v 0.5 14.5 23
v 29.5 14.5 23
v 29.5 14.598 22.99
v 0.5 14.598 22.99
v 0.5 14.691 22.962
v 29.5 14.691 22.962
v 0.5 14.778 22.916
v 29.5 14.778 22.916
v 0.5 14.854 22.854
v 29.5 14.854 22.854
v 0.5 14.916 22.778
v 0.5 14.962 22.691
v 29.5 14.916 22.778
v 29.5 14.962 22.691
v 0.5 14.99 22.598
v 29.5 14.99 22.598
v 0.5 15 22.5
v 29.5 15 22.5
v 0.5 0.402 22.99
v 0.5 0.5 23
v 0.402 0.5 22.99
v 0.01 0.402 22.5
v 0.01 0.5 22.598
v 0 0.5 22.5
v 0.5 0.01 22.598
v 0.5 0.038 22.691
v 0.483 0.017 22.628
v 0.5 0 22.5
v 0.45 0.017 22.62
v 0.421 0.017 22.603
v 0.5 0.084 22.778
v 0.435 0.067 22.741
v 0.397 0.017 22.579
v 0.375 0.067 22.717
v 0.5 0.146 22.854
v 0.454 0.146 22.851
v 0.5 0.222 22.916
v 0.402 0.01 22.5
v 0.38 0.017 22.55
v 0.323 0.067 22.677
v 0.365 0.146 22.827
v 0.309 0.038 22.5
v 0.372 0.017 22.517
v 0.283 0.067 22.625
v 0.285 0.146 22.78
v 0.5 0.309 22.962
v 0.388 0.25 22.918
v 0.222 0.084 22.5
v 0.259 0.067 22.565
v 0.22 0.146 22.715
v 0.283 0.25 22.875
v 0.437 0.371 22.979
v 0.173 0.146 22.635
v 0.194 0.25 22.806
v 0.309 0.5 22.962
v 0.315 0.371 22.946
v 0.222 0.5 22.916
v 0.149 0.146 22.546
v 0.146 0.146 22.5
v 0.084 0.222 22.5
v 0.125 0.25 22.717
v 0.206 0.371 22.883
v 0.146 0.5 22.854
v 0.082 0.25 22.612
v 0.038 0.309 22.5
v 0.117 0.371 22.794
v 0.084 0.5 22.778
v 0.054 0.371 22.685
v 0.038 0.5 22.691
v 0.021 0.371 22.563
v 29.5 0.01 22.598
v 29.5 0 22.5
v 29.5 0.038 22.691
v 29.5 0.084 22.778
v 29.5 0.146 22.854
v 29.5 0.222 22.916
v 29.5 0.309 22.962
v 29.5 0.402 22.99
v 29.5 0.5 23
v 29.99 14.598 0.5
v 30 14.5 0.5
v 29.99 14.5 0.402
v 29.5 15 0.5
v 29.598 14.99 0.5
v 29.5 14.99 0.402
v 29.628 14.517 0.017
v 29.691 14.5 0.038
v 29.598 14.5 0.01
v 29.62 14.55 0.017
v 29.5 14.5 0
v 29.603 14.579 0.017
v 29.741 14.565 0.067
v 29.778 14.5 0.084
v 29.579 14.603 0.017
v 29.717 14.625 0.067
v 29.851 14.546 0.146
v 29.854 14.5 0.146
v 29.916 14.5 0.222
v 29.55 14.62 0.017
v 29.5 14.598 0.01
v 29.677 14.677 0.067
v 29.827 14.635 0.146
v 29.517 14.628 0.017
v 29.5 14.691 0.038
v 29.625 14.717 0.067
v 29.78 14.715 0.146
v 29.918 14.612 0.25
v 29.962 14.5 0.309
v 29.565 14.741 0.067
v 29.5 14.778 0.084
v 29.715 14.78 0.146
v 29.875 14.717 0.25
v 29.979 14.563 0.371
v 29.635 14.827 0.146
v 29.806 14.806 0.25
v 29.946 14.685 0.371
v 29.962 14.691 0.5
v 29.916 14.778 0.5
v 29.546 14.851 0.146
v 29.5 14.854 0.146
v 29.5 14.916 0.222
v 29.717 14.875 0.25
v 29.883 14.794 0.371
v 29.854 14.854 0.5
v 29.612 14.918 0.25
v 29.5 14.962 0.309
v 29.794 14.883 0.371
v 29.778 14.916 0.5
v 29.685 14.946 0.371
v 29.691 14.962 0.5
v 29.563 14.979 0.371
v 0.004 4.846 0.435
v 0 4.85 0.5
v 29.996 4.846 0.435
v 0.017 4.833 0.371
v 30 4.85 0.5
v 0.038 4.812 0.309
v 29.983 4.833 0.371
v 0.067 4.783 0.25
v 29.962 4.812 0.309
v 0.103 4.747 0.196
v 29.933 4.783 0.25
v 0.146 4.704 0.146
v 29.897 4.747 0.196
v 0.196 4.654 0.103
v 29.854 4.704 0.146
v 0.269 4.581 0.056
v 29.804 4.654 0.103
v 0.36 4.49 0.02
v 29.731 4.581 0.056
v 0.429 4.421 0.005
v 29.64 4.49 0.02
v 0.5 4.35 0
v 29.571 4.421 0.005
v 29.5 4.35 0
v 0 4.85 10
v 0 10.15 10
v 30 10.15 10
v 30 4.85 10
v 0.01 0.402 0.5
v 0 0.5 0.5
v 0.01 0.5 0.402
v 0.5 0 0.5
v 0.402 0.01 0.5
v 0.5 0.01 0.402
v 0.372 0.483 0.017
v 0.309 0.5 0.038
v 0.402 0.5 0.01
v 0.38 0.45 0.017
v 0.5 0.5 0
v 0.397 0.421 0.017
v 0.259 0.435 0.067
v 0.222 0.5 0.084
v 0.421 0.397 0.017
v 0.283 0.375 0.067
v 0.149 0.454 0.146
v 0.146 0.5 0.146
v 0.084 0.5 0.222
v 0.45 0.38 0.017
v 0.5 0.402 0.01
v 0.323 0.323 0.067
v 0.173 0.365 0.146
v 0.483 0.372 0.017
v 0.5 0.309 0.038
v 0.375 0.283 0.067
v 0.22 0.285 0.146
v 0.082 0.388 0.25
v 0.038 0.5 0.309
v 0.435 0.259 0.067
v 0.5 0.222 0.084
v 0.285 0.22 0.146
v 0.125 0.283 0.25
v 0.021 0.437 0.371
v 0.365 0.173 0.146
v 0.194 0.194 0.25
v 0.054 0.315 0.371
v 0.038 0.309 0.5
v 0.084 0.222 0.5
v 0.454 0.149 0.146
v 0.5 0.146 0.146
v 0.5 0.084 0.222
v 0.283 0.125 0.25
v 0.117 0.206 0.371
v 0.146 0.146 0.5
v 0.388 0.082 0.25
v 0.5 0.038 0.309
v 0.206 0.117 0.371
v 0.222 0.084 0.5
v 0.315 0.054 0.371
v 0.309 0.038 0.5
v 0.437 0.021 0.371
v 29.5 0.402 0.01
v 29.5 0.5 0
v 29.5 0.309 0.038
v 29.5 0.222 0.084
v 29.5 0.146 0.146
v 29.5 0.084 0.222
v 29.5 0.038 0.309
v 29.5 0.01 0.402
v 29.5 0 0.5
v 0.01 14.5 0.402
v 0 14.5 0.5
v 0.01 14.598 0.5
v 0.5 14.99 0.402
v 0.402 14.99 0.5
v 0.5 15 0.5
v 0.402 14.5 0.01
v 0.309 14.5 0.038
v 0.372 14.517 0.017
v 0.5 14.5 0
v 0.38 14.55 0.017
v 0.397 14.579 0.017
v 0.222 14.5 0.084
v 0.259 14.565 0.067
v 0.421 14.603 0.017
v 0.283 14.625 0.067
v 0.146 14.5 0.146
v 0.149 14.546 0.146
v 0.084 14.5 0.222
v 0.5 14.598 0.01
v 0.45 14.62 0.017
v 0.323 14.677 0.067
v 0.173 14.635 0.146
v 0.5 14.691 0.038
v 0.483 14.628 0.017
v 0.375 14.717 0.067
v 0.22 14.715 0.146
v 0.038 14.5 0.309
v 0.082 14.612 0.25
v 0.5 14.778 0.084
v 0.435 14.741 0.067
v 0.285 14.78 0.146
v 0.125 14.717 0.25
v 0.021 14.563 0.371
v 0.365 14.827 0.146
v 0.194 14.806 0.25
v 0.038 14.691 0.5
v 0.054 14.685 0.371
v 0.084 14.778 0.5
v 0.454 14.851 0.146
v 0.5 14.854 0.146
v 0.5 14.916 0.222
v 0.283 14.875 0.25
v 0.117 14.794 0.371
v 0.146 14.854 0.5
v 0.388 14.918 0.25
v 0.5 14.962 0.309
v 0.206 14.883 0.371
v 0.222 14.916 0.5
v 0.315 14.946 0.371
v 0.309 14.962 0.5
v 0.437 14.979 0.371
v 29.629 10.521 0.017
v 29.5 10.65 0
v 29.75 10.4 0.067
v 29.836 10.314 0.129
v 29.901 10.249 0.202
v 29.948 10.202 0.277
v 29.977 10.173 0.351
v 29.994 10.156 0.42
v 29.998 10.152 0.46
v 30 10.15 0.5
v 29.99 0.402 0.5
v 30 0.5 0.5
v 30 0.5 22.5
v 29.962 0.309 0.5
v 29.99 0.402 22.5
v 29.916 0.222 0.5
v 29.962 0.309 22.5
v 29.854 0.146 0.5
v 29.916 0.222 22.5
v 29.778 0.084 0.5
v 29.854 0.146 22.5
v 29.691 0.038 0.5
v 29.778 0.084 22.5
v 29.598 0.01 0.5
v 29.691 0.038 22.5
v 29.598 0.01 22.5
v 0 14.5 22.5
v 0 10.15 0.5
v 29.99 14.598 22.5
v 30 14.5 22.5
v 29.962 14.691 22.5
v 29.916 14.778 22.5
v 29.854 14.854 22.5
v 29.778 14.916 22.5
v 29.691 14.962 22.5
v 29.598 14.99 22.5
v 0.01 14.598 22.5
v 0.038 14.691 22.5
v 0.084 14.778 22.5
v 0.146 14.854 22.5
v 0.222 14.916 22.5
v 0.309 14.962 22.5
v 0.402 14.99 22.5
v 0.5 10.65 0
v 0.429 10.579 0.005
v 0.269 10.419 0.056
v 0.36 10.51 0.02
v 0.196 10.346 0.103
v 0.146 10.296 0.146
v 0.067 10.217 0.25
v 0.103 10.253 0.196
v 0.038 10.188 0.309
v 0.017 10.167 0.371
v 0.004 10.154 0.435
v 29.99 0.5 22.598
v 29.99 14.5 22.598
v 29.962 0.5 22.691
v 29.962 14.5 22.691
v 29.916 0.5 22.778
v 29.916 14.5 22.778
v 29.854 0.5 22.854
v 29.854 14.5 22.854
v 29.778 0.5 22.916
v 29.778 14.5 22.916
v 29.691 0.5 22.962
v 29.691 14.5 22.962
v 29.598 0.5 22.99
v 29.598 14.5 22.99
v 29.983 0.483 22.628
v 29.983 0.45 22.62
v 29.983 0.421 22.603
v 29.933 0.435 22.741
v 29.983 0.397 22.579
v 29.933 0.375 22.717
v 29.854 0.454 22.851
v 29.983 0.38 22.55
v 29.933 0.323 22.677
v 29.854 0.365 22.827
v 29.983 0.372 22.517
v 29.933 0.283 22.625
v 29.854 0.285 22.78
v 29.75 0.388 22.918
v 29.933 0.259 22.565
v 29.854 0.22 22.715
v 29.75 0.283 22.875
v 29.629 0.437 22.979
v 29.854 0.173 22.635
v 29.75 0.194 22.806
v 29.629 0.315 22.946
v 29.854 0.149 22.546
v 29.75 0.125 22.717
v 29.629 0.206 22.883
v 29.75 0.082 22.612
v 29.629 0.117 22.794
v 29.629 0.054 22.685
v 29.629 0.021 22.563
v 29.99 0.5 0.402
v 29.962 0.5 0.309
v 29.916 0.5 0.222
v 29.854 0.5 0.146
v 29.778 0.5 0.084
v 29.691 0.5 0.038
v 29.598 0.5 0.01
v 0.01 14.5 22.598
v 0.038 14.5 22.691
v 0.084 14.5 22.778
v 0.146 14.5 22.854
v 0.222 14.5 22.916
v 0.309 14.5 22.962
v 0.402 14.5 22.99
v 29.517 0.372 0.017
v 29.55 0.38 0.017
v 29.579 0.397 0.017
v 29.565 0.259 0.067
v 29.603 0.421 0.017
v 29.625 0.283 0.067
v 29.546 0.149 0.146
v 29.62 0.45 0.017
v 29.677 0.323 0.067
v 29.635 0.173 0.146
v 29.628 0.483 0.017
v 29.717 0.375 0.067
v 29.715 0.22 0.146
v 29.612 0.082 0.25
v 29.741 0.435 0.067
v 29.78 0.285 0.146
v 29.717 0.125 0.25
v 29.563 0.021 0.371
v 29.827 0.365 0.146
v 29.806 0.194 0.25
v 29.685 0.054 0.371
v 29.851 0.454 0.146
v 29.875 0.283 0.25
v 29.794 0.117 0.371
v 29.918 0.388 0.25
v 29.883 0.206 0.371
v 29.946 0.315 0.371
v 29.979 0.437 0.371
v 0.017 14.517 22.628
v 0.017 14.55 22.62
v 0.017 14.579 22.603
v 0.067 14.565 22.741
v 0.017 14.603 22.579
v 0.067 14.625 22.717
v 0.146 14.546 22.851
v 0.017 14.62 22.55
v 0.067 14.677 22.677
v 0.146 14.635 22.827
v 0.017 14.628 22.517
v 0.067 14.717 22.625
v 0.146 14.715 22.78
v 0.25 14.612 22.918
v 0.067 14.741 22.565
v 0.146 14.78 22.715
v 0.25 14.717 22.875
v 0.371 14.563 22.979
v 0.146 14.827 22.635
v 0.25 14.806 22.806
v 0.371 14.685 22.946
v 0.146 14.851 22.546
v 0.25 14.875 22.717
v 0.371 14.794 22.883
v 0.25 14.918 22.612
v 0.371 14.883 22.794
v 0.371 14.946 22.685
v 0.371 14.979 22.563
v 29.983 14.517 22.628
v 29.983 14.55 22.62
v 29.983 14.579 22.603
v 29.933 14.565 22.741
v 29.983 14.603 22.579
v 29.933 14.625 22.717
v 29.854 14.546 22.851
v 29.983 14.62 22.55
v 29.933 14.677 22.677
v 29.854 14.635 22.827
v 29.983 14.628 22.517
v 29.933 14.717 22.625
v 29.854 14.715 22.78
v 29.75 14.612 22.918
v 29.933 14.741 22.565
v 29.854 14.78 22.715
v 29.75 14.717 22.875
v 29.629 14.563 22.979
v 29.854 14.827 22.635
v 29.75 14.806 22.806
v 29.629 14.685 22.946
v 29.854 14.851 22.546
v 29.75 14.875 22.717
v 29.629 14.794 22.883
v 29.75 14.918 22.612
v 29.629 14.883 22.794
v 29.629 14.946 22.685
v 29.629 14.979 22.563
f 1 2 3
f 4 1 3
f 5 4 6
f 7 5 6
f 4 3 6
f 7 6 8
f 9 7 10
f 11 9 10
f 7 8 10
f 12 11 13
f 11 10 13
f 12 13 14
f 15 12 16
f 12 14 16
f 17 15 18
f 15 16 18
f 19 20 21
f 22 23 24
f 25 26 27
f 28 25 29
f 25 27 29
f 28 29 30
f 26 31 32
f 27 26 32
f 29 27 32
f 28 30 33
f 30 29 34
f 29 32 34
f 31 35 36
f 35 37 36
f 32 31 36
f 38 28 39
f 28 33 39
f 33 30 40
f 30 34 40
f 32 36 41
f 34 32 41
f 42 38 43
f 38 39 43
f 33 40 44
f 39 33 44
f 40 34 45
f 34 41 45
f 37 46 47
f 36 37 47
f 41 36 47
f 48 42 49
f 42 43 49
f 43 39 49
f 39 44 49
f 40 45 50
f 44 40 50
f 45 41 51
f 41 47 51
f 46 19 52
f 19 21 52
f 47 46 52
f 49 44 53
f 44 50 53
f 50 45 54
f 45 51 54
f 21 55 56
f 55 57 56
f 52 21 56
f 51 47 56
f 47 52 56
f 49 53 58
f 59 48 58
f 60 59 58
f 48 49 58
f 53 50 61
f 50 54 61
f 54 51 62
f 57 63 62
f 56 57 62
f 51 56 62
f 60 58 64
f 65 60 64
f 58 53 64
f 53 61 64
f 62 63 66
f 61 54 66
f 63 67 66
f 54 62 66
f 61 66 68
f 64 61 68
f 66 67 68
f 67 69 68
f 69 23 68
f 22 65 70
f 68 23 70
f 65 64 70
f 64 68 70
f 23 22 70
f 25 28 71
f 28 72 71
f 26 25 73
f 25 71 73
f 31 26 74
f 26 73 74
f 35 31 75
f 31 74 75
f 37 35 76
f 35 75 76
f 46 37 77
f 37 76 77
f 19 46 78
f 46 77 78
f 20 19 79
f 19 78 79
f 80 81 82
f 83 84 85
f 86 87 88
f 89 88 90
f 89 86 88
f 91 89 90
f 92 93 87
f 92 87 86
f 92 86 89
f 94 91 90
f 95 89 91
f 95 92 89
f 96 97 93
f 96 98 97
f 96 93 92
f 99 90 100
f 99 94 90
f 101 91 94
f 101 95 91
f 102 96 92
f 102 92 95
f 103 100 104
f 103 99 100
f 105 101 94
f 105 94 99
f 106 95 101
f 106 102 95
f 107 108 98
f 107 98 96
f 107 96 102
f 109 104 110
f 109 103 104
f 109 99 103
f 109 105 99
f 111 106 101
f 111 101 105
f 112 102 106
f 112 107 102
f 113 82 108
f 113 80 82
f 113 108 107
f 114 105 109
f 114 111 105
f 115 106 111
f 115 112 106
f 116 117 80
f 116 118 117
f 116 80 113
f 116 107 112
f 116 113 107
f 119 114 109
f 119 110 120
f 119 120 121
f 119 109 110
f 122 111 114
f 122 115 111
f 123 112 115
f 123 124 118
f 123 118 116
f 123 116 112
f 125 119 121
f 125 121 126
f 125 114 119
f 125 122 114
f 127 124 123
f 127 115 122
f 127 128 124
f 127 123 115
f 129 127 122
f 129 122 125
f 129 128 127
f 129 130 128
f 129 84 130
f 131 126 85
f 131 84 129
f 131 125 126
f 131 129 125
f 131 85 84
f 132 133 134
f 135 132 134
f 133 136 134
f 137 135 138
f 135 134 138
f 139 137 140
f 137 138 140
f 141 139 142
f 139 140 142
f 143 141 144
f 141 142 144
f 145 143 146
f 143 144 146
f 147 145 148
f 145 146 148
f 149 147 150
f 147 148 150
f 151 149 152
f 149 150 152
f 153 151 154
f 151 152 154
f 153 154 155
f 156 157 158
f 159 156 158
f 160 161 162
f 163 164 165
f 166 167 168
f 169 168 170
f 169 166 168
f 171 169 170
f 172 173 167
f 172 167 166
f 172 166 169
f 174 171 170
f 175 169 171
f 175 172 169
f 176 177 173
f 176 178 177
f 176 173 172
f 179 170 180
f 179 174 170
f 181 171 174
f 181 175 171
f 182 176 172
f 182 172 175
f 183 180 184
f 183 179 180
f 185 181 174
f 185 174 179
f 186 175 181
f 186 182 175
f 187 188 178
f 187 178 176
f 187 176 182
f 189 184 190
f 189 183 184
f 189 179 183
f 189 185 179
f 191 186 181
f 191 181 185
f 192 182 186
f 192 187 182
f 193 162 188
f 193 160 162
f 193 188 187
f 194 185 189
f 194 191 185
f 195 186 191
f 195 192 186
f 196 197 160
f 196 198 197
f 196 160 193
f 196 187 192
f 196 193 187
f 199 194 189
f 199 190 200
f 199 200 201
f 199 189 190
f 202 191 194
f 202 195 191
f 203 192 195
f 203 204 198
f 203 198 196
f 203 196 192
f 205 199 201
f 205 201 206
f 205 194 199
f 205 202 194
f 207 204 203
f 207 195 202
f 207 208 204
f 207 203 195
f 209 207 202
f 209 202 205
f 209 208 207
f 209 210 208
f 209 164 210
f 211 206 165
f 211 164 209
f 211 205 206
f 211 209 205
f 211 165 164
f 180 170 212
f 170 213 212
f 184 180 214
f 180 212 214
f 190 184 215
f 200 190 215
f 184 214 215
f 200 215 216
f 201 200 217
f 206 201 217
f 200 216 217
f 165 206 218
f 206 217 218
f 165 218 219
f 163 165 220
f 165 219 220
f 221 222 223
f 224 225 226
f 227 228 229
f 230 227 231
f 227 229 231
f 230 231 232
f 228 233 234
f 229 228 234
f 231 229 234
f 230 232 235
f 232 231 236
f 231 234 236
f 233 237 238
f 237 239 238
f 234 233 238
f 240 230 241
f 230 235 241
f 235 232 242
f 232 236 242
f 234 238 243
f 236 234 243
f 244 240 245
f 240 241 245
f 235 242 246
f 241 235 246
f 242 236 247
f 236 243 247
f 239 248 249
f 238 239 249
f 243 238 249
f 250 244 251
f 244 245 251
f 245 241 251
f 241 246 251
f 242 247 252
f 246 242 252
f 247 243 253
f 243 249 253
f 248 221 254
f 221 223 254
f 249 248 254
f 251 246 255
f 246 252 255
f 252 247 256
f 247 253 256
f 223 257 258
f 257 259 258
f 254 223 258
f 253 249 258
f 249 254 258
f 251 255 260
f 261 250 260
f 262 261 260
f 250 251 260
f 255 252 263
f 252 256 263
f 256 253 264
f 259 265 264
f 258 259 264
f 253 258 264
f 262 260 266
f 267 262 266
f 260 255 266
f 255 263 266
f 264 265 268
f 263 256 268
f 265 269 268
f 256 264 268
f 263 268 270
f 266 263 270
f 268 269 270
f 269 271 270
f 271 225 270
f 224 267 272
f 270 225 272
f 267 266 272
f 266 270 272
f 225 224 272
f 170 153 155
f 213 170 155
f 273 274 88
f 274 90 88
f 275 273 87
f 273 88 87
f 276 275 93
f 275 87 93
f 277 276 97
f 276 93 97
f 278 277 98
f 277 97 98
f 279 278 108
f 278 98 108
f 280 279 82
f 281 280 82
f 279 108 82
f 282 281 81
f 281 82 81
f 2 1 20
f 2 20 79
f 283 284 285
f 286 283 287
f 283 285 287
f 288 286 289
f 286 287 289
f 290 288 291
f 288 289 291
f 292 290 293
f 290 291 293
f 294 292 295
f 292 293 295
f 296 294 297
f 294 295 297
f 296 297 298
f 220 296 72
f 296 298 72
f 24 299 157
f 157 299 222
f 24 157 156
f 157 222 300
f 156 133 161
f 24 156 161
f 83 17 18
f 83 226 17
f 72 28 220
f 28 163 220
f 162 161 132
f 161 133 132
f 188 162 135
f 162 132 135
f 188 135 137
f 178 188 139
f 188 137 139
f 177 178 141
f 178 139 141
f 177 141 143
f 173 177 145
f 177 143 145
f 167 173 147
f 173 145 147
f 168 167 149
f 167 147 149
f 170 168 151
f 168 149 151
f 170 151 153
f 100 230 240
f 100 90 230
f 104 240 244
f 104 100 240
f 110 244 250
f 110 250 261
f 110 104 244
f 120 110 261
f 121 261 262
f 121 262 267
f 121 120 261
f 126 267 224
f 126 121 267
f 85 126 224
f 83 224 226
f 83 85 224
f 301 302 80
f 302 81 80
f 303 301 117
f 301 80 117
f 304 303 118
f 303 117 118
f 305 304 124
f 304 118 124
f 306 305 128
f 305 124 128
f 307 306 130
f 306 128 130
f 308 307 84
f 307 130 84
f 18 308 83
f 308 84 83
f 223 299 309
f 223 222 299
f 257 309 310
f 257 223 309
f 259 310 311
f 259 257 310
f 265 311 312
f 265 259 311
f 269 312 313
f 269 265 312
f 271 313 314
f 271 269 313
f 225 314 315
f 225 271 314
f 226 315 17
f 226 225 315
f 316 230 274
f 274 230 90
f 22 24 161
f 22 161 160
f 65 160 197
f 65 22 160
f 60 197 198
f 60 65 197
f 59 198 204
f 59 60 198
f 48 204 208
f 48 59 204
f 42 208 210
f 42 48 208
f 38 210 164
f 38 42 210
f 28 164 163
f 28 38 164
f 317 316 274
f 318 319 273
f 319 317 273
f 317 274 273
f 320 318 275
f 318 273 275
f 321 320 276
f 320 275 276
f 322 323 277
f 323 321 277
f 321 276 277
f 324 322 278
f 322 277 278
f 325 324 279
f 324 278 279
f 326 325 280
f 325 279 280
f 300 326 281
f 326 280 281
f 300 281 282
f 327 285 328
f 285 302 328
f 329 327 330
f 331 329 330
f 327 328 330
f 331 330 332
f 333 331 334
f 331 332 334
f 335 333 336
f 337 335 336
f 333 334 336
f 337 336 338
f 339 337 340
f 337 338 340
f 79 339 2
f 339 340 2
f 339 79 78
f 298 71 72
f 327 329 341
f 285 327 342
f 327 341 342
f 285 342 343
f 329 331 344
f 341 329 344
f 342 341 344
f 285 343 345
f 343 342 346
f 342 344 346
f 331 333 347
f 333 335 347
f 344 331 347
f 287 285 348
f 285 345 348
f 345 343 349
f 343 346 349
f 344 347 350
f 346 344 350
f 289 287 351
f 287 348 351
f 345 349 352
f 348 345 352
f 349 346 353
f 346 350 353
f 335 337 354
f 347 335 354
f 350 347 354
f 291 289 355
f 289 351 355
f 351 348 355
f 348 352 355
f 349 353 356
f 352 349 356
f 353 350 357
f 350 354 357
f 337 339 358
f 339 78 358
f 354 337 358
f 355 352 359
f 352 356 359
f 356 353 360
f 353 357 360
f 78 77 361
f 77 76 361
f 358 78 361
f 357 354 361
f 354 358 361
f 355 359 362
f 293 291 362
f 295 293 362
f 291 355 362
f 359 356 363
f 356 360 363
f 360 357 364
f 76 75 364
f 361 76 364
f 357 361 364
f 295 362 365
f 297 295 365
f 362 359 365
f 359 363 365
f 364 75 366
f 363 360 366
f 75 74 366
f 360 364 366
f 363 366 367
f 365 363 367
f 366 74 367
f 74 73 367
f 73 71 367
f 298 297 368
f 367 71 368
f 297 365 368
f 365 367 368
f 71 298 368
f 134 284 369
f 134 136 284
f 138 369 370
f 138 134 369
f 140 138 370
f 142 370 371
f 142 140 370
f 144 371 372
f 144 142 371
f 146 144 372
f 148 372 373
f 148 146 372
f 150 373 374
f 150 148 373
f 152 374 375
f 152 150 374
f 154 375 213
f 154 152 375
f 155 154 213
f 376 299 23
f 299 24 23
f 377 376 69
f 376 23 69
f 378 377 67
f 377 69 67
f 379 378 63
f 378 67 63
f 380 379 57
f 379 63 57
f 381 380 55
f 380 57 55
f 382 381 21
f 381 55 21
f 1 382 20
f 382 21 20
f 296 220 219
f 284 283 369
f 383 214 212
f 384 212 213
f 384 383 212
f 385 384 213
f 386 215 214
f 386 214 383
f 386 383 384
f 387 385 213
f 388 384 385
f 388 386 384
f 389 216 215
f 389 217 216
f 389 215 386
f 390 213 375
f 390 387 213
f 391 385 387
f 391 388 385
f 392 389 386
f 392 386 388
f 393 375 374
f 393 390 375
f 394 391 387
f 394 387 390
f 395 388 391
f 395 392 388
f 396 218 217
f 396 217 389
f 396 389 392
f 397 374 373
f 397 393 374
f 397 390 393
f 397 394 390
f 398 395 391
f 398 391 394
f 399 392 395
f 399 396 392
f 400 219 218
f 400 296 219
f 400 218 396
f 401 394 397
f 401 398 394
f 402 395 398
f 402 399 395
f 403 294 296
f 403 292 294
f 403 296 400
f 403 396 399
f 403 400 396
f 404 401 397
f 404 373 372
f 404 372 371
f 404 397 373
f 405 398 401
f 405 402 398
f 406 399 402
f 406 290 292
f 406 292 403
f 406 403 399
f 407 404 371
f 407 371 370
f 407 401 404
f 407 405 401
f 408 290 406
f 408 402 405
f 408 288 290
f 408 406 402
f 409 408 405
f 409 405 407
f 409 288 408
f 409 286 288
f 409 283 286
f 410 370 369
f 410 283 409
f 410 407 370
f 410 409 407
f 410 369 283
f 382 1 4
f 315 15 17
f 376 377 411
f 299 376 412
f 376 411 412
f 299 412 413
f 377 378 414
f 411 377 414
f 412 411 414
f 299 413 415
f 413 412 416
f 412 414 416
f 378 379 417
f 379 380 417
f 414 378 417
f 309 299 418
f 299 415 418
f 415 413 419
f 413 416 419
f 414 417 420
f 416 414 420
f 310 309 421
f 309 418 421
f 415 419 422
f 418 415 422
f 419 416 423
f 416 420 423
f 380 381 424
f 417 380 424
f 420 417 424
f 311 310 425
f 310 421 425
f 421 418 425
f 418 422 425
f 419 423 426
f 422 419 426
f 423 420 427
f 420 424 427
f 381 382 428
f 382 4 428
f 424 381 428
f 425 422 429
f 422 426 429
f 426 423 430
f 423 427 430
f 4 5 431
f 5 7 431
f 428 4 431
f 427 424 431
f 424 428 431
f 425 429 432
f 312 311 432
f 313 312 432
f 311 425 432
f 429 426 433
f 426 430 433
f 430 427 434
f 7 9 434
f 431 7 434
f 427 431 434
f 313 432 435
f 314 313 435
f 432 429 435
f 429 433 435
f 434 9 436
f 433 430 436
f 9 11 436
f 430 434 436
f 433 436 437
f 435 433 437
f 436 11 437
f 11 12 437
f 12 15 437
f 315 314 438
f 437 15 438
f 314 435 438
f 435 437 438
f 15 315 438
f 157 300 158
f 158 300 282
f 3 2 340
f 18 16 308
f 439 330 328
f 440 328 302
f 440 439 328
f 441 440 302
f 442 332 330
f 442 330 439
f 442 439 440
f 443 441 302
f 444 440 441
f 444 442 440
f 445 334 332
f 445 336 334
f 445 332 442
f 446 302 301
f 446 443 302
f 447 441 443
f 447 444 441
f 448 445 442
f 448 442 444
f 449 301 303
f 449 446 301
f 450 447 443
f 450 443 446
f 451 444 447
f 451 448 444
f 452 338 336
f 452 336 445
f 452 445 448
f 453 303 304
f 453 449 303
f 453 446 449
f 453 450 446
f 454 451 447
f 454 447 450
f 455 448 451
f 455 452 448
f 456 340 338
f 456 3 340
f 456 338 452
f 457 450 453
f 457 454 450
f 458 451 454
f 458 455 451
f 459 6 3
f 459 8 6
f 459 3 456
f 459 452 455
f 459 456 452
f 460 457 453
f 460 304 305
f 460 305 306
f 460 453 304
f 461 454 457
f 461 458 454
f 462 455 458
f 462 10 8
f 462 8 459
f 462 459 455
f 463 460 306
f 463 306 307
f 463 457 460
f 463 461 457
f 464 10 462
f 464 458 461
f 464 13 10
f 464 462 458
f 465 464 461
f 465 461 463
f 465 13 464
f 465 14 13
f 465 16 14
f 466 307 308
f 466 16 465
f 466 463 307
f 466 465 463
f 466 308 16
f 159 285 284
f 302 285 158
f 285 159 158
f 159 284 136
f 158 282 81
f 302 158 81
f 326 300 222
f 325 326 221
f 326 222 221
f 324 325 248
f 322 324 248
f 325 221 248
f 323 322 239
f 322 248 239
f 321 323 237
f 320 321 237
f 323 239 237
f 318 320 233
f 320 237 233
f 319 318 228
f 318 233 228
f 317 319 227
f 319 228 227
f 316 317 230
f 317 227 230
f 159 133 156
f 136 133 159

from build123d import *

# Parameters (mm, degrees)
F0_W     = 30
F0_H     = 4.85
F1_DEPTH = 10
F2_W     = 30
F2_H     = 4.85
F2_H_2   = 10.15
F3_DEPTH = 13
F4_R     = 0.5


with BuildPart() as f1:
    # F0 (on Top) → F1 (new body)
    with BuildSketch(Plane.XY):
        with Locations((15, 12.575)):
            Rectangle(F0_W, F0_H)
    extrude(amount=F1_DEPTH)



with BuildPart() as f1b:
    # F0 (on Top) → F1, piece 2 (new body)
    with BuildSketch(Plane.XY):
        with Locations((15, 2.425)):
            Rectangle(F0_W, F0_H)
    extrude(amount=F1_DEPTH)


with BuildPart() as f1_1:
    add(f1.part)

    add(f1b.part)  # F3 merges F1b
    # F2 (on face) → F3 (join)
    with BuildSketch(Plane.XY.offset(10)):
        with Locations((15, 12.575)):
            Rectangle(F2_W, F2_H)
        with Locations((15, 5.075)):
            Rectangle(F2_W, F2_H_2)
    extrude(amount=F3_DEPTH)

    # F4
    f4_edges = [f1_1.edges().sort_by_distance(p)[0] for p in [
        (15, 15, 23),
        (0, 7.5, 23),
        (15, 0, 23),
        (30, 7.5, 23),
        (0, 15, 11.5),
        (30, 15, 11.5),
        (30, 0, 11.5),
        (0, 0, 11.5),
        (0, 2.425, 0),
        (15, 0, 0),
        (30, 2.425, 0),
        (15, 4.85, 0),
        (0, 12.575, 0),
        (30, 12.575, 0),
        (15, 10.15, 0),
        (15, 15, 0),
    ]]
    fillet(f4_edges, radius=F4_R)


solid = f1_1.part
